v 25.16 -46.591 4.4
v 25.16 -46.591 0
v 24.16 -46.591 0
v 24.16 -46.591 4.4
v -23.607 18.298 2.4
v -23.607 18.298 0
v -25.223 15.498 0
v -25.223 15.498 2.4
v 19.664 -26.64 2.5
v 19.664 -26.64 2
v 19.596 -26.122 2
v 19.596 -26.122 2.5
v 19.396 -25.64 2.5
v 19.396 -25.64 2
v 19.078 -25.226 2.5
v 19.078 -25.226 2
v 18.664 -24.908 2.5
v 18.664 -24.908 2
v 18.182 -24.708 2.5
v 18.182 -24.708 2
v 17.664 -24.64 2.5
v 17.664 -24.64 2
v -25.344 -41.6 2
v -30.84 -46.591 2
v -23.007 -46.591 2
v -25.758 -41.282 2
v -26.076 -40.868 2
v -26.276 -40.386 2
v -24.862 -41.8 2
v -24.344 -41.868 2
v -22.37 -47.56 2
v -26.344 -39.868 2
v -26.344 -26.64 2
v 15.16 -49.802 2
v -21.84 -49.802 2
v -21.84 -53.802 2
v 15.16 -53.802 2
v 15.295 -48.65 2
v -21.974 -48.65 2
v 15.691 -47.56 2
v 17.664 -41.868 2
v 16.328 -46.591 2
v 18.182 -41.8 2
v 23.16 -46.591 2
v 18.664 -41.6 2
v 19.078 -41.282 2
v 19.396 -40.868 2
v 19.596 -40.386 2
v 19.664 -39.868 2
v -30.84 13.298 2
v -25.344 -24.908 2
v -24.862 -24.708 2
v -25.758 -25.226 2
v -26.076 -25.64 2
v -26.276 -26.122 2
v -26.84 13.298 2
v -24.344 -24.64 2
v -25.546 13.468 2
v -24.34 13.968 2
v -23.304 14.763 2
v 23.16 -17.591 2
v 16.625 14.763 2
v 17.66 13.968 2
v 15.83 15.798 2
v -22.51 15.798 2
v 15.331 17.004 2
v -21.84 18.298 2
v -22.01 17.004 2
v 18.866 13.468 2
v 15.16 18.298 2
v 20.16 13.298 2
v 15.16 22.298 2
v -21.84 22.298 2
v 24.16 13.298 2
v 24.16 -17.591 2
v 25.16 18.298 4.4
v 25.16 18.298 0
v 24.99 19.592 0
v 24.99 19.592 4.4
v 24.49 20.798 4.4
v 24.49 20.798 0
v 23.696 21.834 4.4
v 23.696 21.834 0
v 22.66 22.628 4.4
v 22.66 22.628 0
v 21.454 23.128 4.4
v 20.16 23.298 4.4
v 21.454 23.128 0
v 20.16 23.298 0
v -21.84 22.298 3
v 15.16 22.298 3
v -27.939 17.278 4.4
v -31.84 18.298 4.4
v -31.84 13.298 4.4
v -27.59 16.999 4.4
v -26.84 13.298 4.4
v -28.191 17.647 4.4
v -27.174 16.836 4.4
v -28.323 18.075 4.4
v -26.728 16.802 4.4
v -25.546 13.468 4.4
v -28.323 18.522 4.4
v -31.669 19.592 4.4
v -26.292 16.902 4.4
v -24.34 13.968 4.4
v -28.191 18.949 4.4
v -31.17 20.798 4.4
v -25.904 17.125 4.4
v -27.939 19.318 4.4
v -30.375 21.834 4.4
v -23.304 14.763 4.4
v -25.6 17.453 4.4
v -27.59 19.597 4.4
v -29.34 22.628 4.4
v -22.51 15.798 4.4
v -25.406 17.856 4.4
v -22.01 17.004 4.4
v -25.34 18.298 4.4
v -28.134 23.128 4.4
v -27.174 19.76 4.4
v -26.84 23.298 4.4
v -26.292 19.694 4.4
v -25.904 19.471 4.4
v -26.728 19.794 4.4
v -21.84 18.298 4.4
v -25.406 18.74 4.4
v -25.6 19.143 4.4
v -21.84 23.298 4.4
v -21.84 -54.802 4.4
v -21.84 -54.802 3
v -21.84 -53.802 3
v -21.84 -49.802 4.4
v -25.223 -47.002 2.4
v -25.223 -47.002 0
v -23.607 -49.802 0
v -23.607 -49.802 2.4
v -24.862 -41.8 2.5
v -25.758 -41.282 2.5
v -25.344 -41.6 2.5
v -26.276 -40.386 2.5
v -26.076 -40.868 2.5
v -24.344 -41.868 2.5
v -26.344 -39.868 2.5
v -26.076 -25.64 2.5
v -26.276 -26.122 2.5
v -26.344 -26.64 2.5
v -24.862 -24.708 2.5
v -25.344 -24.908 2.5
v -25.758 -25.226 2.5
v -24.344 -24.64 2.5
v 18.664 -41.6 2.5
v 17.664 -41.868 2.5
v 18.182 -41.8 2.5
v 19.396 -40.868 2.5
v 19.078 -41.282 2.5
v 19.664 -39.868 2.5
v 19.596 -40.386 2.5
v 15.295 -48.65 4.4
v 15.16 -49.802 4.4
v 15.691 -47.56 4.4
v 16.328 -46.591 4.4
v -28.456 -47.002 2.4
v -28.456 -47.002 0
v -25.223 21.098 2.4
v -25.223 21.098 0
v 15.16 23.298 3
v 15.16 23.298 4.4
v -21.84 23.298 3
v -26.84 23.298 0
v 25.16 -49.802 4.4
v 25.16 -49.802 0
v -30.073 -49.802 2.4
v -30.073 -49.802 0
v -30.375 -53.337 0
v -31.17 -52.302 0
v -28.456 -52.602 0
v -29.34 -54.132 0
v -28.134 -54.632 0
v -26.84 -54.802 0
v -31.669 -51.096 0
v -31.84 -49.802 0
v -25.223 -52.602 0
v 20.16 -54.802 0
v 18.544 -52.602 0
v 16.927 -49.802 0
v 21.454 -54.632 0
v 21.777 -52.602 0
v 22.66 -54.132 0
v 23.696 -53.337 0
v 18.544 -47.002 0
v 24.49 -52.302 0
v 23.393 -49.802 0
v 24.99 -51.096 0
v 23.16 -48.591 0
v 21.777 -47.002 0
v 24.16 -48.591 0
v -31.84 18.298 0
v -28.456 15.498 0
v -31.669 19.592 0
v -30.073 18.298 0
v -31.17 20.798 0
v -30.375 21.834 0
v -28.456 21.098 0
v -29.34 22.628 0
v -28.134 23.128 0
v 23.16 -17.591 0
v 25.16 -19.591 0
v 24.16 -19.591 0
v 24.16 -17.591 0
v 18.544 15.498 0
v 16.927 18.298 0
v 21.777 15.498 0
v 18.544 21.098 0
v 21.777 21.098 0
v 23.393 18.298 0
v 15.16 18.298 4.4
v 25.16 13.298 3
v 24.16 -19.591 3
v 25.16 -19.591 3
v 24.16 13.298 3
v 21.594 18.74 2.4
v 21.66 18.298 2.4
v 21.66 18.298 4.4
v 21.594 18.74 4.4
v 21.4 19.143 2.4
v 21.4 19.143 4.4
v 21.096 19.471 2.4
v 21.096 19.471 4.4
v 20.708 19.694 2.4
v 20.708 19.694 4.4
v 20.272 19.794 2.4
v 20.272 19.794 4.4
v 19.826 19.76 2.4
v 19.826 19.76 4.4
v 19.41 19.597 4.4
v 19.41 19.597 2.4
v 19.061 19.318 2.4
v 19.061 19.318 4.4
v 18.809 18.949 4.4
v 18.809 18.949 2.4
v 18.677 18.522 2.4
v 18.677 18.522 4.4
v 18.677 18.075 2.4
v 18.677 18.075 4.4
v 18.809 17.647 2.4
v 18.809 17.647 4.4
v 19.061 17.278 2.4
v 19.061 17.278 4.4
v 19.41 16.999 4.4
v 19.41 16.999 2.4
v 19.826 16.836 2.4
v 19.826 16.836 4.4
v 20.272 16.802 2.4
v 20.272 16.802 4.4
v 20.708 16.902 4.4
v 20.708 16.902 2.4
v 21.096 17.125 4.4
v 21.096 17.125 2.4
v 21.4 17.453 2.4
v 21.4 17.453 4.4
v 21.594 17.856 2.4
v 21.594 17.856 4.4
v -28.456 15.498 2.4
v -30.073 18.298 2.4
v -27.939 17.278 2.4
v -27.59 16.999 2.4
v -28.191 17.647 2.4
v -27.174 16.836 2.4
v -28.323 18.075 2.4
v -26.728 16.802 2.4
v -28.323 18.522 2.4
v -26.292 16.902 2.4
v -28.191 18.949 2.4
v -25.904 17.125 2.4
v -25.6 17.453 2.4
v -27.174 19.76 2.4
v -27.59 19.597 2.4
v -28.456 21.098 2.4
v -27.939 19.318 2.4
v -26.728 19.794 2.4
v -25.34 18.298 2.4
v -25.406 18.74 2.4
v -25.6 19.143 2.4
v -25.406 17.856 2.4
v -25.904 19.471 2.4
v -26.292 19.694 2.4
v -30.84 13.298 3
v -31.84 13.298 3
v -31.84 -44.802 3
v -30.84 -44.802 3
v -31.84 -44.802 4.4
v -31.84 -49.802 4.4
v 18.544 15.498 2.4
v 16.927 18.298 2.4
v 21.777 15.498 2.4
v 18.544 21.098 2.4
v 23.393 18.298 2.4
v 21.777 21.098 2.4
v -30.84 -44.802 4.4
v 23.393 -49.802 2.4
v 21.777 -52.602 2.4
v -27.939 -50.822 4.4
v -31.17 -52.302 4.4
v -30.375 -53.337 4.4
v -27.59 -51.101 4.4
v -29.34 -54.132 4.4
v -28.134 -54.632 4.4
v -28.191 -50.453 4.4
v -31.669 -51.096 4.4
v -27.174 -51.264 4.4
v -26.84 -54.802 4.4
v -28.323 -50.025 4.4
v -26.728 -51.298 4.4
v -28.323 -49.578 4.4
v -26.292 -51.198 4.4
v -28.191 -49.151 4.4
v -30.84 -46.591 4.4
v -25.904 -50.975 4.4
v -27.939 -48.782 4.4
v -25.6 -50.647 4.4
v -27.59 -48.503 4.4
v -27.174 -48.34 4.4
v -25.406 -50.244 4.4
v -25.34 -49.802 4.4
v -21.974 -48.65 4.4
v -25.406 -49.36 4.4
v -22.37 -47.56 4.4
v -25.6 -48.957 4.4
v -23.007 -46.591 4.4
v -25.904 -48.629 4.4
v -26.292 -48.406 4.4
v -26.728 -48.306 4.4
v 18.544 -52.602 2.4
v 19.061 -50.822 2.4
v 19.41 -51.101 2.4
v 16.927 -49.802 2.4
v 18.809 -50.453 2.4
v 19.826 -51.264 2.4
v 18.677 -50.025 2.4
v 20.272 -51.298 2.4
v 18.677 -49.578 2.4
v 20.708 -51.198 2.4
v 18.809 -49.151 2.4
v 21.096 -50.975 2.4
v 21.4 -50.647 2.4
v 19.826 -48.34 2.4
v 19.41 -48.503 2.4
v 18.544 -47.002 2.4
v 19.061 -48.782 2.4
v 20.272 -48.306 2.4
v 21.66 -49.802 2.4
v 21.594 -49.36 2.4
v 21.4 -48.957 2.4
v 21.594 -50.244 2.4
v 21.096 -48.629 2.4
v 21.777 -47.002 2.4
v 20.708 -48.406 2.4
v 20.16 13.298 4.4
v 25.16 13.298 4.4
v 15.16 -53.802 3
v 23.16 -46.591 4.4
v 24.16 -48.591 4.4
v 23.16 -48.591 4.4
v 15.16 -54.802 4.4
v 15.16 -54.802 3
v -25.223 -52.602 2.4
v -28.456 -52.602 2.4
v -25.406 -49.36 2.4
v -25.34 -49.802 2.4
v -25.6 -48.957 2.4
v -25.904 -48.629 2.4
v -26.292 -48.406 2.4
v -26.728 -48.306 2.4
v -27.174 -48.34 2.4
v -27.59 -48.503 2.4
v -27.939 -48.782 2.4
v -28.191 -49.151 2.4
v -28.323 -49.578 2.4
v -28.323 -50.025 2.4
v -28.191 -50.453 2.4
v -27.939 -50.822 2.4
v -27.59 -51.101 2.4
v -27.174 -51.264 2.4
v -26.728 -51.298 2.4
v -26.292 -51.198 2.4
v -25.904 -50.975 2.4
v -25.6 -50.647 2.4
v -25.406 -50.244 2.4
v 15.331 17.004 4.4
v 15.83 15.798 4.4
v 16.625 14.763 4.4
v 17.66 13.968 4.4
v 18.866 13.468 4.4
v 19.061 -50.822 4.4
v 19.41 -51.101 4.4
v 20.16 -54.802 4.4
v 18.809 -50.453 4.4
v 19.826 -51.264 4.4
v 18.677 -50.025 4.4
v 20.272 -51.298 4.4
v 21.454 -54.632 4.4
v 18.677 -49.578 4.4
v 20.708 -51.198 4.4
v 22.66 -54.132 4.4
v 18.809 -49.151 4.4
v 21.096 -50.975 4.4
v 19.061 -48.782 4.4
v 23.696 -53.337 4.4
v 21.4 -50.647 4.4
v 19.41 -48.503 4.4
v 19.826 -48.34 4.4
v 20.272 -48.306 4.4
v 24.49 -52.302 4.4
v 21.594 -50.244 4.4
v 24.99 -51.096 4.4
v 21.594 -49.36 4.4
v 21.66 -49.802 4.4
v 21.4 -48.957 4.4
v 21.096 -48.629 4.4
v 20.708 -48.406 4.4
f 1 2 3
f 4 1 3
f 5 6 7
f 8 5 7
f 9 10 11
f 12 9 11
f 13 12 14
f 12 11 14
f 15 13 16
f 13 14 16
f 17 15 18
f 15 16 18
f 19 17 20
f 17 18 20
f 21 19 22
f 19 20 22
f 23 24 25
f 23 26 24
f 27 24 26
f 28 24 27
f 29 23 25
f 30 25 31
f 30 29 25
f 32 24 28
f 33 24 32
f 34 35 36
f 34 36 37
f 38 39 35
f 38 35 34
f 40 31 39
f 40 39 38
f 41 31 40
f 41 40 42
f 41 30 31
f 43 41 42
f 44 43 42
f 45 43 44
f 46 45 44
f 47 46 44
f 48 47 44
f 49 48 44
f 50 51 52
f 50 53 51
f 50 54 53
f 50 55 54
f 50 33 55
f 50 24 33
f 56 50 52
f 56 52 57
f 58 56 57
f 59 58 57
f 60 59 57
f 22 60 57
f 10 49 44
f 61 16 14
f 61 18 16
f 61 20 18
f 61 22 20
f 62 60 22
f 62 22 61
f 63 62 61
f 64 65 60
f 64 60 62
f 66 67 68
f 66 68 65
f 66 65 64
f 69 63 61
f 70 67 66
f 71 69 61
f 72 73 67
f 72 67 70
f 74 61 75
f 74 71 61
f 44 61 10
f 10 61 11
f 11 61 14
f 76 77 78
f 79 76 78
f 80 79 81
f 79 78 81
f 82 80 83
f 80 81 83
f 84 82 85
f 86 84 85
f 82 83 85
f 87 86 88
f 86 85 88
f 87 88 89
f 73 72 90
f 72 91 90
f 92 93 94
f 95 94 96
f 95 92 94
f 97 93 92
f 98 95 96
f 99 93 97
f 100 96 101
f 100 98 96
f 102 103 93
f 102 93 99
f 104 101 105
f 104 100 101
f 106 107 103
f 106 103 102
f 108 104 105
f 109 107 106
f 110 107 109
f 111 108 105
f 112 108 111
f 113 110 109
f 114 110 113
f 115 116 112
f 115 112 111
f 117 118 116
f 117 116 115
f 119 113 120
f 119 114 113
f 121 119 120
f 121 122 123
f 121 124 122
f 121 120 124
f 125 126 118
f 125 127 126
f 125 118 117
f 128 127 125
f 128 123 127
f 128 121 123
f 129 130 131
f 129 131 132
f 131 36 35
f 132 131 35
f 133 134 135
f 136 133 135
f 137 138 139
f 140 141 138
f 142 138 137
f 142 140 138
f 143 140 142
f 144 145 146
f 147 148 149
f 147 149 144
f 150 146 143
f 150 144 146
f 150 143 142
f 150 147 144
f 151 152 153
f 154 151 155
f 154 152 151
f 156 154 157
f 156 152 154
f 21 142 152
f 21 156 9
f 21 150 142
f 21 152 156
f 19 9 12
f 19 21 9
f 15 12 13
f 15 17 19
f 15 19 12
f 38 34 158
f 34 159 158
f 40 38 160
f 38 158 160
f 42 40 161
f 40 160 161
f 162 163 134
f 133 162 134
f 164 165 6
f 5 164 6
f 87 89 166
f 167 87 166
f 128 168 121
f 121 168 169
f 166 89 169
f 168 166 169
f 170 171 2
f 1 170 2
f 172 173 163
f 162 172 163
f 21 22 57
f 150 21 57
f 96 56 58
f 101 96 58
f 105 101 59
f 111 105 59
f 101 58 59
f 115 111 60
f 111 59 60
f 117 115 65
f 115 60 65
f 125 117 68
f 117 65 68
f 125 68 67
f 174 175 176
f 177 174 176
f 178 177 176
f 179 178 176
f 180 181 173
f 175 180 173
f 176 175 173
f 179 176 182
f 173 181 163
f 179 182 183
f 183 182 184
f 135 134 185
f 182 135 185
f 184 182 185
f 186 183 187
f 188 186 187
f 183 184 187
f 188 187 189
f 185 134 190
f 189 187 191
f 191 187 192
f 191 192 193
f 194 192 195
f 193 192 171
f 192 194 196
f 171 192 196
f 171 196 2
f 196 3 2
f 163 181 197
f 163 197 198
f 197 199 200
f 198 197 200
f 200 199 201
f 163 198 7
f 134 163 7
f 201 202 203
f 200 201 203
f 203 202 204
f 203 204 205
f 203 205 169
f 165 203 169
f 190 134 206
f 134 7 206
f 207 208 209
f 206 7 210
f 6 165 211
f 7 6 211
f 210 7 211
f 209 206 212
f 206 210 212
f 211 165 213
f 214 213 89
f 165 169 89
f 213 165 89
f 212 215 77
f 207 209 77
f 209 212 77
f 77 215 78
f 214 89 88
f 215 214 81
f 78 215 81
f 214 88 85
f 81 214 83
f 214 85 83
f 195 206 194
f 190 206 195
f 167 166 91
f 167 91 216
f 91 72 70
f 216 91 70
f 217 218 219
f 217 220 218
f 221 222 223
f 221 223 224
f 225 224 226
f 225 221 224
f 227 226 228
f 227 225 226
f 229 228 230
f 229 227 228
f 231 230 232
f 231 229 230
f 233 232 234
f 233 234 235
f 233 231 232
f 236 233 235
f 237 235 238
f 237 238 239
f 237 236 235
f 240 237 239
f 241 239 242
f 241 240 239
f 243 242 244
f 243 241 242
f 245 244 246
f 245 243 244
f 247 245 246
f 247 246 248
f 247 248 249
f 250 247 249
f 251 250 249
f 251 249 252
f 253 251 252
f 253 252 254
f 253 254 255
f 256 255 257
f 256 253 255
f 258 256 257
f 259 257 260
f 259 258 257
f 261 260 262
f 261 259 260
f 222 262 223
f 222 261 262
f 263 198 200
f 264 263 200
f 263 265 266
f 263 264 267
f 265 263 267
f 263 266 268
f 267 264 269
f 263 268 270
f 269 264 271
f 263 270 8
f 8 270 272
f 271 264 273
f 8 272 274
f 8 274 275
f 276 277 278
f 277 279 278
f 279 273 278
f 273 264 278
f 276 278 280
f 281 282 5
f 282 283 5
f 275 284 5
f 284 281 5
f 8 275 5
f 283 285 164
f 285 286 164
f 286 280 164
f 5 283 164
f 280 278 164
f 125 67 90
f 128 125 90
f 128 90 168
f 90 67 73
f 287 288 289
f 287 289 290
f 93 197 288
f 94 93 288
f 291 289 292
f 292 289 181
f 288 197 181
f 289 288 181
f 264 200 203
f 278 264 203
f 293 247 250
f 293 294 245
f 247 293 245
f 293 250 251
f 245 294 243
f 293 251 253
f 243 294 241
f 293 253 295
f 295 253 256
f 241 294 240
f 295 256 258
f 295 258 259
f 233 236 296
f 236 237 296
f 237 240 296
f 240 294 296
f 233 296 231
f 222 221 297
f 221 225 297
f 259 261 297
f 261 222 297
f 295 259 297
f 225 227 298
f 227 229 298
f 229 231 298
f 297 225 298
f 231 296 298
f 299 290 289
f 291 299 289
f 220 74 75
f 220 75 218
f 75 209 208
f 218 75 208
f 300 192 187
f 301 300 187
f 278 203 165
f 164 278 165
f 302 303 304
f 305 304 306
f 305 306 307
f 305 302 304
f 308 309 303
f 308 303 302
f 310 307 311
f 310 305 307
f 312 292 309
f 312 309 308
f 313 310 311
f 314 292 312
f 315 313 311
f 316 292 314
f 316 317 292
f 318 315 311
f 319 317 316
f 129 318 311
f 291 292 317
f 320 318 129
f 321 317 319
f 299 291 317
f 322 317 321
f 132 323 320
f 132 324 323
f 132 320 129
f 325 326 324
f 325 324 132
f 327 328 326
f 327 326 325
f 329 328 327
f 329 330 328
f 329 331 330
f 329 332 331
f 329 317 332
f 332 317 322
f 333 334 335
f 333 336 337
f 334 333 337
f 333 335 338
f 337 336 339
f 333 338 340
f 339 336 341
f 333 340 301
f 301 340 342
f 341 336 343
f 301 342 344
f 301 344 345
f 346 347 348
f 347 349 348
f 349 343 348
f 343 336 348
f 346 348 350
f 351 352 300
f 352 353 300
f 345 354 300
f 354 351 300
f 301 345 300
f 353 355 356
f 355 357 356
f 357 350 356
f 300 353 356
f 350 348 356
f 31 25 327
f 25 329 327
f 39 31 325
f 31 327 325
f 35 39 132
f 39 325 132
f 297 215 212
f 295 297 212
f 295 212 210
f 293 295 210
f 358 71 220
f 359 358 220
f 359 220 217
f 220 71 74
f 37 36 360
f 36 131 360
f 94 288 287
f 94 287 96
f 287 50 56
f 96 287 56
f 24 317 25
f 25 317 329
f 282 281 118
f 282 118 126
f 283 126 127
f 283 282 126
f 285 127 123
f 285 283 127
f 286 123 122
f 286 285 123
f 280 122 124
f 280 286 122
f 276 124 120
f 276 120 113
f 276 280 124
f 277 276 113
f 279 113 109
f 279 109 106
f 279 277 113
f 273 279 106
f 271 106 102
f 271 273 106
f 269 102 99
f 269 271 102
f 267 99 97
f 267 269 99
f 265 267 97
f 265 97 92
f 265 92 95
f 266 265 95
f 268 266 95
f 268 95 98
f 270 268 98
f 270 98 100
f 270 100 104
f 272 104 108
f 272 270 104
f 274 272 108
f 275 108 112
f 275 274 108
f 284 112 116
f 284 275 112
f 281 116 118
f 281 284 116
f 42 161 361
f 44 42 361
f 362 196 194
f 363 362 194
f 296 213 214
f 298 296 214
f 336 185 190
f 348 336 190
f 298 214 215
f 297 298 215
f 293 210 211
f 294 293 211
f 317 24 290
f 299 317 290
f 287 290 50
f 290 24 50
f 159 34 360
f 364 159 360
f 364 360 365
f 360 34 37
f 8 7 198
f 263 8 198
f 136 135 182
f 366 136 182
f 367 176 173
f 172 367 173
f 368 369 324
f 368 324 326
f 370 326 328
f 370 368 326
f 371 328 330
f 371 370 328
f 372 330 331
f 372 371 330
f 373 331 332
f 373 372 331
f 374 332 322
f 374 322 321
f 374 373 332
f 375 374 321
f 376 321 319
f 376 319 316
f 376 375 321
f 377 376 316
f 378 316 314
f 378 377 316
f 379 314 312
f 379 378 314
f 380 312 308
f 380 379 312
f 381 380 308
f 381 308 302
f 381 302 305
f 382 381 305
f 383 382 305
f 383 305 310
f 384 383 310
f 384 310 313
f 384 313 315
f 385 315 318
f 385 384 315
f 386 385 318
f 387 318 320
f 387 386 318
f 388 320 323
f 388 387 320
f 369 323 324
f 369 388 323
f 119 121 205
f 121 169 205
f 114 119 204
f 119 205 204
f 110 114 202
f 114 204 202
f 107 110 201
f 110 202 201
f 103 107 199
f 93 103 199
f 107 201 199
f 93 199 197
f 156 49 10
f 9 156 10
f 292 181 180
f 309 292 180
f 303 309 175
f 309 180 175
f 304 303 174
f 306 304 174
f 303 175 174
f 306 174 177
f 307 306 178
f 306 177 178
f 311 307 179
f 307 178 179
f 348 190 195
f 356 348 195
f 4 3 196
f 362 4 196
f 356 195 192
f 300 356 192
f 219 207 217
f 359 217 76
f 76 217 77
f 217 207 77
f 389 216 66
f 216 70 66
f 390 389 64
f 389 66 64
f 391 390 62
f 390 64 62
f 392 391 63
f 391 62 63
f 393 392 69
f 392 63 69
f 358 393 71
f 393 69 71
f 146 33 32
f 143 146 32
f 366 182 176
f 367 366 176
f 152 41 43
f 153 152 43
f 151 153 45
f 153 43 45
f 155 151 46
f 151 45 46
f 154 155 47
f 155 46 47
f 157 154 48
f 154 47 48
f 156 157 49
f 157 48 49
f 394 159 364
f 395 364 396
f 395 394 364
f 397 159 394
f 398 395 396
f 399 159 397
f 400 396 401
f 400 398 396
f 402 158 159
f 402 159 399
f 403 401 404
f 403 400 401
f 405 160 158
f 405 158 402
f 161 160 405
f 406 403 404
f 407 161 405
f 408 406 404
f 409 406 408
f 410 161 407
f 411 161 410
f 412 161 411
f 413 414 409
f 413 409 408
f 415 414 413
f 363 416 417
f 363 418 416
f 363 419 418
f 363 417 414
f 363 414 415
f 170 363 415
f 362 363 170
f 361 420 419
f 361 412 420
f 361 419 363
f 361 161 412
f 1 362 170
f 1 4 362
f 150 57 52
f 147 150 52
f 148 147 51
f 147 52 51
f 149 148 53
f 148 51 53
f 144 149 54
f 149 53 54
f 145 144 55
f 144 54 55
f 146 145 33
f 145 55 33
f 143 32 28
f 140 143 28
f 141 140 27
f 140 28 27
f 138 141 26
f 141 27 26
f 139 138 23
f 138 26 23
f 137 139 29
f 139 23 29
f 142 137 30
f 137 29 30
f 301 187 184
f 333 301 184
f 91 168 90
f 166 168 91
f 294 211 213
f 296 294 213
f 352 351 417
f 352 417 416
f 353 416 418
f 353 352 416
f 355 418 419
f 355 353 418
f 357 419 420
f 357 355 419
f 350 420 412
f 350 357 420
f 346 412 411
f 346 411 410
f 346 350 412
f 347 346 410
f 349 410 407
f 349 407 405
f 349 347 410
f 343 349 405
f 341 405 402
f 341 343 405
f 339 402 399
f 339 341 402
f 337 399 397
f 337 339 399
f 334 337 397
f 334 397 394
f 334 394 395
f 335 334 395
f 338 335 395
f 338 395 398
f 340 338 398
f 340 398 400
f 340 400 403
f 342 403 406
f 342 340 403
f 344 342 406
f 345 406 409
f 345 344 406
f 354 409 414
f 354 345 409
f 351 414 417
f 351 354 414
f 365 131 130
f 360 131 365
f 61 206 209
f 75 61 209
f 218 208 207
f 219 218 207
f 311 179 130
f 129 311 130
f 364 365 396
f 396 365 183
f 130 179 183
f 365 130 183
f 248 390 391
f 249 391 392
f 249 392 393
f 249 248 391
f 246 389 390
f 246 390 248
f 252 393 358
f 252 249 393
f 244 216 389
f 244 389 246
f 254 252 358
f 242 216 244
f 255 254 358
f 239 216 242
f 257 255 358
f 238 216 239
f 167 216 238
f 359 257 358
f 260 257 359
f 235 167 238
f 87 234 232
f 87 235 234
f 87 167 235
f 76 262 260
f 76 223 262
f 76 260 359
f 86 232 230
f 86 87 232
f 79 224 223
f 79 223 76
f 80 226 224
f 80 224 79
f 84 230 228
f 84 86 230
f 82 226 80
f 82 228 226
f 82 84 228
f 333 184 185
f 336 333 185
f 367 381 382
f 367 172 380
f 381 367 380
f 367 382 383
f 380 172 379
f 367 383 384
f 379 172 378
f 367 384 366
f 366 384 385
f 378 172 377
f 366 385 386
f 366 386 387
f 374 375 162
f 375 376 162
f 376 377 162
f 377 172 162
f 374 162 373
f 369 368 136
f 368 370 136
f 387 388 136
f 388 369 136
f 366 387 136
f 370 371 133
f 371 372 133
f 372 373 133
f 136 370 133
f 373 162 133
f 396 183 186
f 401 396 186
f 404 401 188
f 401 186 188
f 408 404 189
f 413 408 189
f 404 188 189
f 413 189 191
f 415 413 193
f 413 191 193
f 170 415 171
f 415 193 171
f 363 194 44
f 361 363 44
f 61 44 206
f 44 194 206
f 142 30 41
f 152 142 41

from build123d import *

# Parameters (mm, degrees)
F1_DEPTH = 2.4
F2_R     = 1.5
F3_DEPTH = 2
F4_DEPTH = 0.4
F2_W     = 37
F2_H     = 1
F5_DEPTH = 0.6
F7_DEPTH = 4.4
F9_DEPTH = 0.5


with BuildPart() as f1:
    # F0 (on Top) → F1 (new body)
    with BuildSketch(Plane.XY):
        with BuildLine():
            Line((20.160271, 23.298074), (-26.839729, 23.298074))
            ThreePointArc((-26.839729, 23.298074), (-30.375263, 21.833608), (-31.839729, 18.298074))
            Line((-31.839729, 18.298074), (-31.839729, -49.801926))
            ThreePointArc((-31.839729, -49.801926), (-30.375263, -53.33746), (-26.839729, -54.801926))
            Line((-26.839729, -54.801926), (20.160271, -54.801926))
            ThreePointArc((20.160271, -54.801926), (23.695805, -53.33746), (25.160271, -49.801926))
            Line((25.160271, -49.801926), (25.160271, 18.298074))
            ThreePointArc((25.160271, 18.298074), (23.695805, 21.833608), (20.160271, 23.298074))
        make_face()
        Polygon((-30.072891, -49.801926), (-28.45631, -47.001926), (-25.223148, -47.001926), (-23.606568, -49.801926), (-25.223148, -52.601926), (-28.45631, -52.601926), align=None, mode=Mode.SUBTRACT)
        Polygon((16.927109, -49.801926), (18.54369, -47.001926), (21.776852, -47.001926), (23.393432, -49.801926), (21.776852, -52.601926), (18.54369, -52.601926), align=None, mode=Mode.SUBTRACT)
        Polygon((-30.072891, 18.298074), (-28.45631, 21.098074), (-25.223148, 21.098074), (-23.606568, 18.298074), (-25.223148, 15.498074), (-28.45631, 15.498074), align=None, mode=Mode.SUBTRACT)
        Polygon((16.927109, 18.298074), (18.54369, 21.098074), (21.776852, 21.098074), (23.393432, 18.298074), (21.776852, 15.498074), (18.54369, 15.498074), align=None, mode=Mode.SUBTRACT)
    extrude(amount=F1_DEPTH)

    # F2 (on face) → F3 (join)
    with BuildSketch(Plane.XY.offset(2.4)):
        with BuildLine():
            Line((-21.839729, 23.298074), (-26.839729, 23.298074))
            ThreePointArc((-26.839729, 23.298074), (-30.375263, 21.833608), (-31.839729, 18.298074))
            Line((-31.839729, 18.298074), (-31.839729, 13.298074))
            Line((-31.839729, 13.298074), (-30.839729, 13.298074))
            Line((-30.839729, 13.298074), (-26.839729, 13.298074))
            ThreePointArc((-26.839729, 13.298074), (-23.304195, 14.76254), (-21.839729, 18.298074))
            Line((-21.839729, 18.298074), (-21.839729, 22.298074))
            Line((-21.839729, 22.298074), (-21.839729, 23.298074))
        make_face()
        Polygon((-28.45631, 15.498074), (-30.072891, 18.298074), (-28.45631, 21.098074), (-25.223148, 21.098074), (-23.606568, 18.298074), (-25.223148, 15.498074), align=None, mode=Mode.SUBTRACT)
        with BuildLine():
            Line((20.160271, 23.298074), (15.160271, 23.298074))
            Line((15.160271, 23.298074), (15.160271, 22.298074))
            Line((15.160271, 22.298074), (15.160271, 18.298074))
            ThreePointArc((15.160271, 18.298074), (16.624737, 14.76254), (20.160271, 13.298074))
            Line((20.160271, 13.298074), (24.160271, 13.298074))
            Line((24.160271, 13.298074), (25.160271, 13.298074))
            Line((25.160271, 13.298074), (25.160271, 18.298074))
            ThreePointArc((25.160271, 18.298074), (23.695805, 21.833608), (20.160271, 23.298074))
        make_face()
        Polygon((23.393432, 18.298074), (21.776852, 15.498074), (18.54369, 15.498074), (16.927109, 18.298074), (18.54369, 21.098074), (21.776852, 21.098074), align=None, mode=Mode.SUBTRACT)
        with BuildLine():
            Line((25.160271, -49.801926), (25.160271, -44.801926))
            Line((25.160271, -44.801926), (24.160271, -44.801926))
            Line((24.160271, -44.801926), (24.160271, -46.590926))
            Line((24.160271, -46.590926), (16.327585, -46.590926))
            ThreePointArc((16.327585, -46.590926), (15.461152, -48.093627), (15.160271, -49.801926))
            Line((15.160271, -49.801926), (15.160271, -53.801926))
            Line((15.160271, -53.801926), (15.160271, -54.801926))
            Line((15.160271, -54.801926), (20.160271, -54.801926))
            ThreePointArc((20.160271, -54.801926), (23.695805, -53.33746), (25.160271, -49.801926))
        make_face()
        Polygon((18.54369, -52.601926), (16.927109, -49.801926), (18.54369, -47.001926), (21.776852, -47.001926), (23.393432, -49.801926), (21.776852, -52.601926), align=None, mode=Mode.SUBTRACT)
        with BuildLine():
            Line((-30.839729, -44.801926), (-31.839729, -44.801926))
            Line((-31.839729, -44.801926), (-31.839729, -49.801926))
            ThreePointArc((-31.839729, -49.801926), (-30.375263, -53.33746), (-26.839729, -54.801926))
            Line((-26.839729, -54.801926), (-21.839729, -54.801926))
            Line((-21.839729, -54.801926), (-21.839729, -53.801926))
            Line((-21.839729, -53.801926), (-21.839729, -49.801926))
            ThreePointArc((-21.839729, -49.801926), (-22.140611, -48.093627), (-23.007044, -46.590926))
            Line((-23.007044, -46.590926), (-30.839729, -46.590926))
            Line((-30.839729, -46.590926), (-30.839729, -44.801926))
        make_face()
        Polygon((-25.223148, -52.601926), (-28.45631, -52.601926), (-30.072891, -49.801926), (-28.45631, -47.001926), (-25.223148, -47.001926), (-23.606568, -49.801926), align=None, mode=Mode.SUBTRACT)
        Polygon((-30.072891, -49.801926), (-28.45631, -52.601926), (-25.223148, -52.601926), (-23.606568, -49.801926), (-25.223148, -47.001926), (-28.45631, -47.001926), align=None)
        with Locations((-26.839729, -49.801926)):
            Circle(F2_R, mode=Mode.SUBTRACT)
        Polygon((18.54369, -47.001926), (16.927109, -49.801926), (18.54369, -52.601926), (21.776852, -52.601926), (23.393432, -49.801926), (21.776852, -47.001926), align=None)
        with Locations((20.160271, -49.801926)):
            Circle(F2_R, mode=Mode.SUBTRACT)
        Polygon((18.54369, 15.498074), (21.776852, 15.498074), (23.393432, 18.298074), (21.776852, 21.098074), (18.54369, 21.098074), (16.927109, 18.298074), align=None)
        with Locations((20.160271, 18.298074)):
            Circle(F2_R, mode=Mode.SUBTRACT)
        Polygon((-28.45631, 21.098074), (-30.072891, 18.298074), (-28.45631, 15.498074), (-25.223148, 15.498074), (-23.606568, 18.298074), (-25.223148, 21.098074), align=None)
        with Locations((-26.839729, 18.298074)):
            Circle(F2_R, mode=Mode.SUBTRACT)
    extrude(amount=F3_DEPTH)

    # F2 (on face) → F4 (cut)
    with BuildSketch(Plane.XY.offset(2.4)):
        with BuildLine():
            Line((15.160271, 22.298074), (-21.839729, 22.298074))
            Line((-21.839729, 22.298074), (-21.839729, 18.298074))
            ThreePointArc((-21.839729, 18.298074), (-23.304195, 14.76254), (-26.839729, 13.298074))
            Line((-26.839729, 13.298074), (-30.839729, 13.298074))
            Line((-30.839729, 13.298074), (-30.839729, -43.238085))
            Line((-30.839729, -43.238085), (-30.839729, -44.801926))
            Line((-30.839729, -44.801926), (-30.839729, -46.590926))
            Line((-30.839729, -46.590926), (-23.007044, -46.590926))
            ThreePointArc((-23.007044, -46.590926), (-22.140611, -48.093627), (-21.839729, -49.801926))
            Line((-21.839729, -49.801926), (-21.839729, -53.801926))
            Line((-21.839729, -53.801926), (15.160271, -53.801926))
            Line((15.160271, -53.801926), (15.160271, -49.801926))
            ThreePointArc((15.160271, -49.801926), (15.461152, -48.093627), (16.327585, -46.590926))
            Line((16.327585, -46.590926), (24.160271, -46.590926))
            Line((24.160271, -46.590926), (24.160271, -44.801926))
            Line((24.160271, -44.801926), (24.160271, -43.238085))
            Line((24.160271, -43.238085), (24.160271, 13.298074))
            Line((24.160271, 13.298074), (20.160271, 13.298074))
            ThreePointArc((20.160271, 13.298074), (16.624737, 14.76254), (15.160271, 18.298074))
            Line((15.160271, 18.298074), (15.160271, 22.298074))
        make_face()
    extrude(amount=-F4_DEPTH, mode=Mode.SUBTRACT)

    # F2 (on face) → F5 (join)
    with BuildSketch(Plane.XY.offset(2.4)):
        Polygon((-30.839729, 13.298074), (-31.839729, 13.298074), (-31.839729, -44.801926), (-30.839729, -44.801926), (-30.839729, -43.238085), align=None)
        with Locations((-3.339729, 22.798074)):
            Rectangle(F2_W, F2_H)
        Polygon((25.160271, -44.801926), (25.160271, 13.298074), (24.160271, 13.298074), (24.160271, -43.238085), (24.160271, -44.801926), align=None)
        with Locations((-3.339729, -54.301926)):
            Rectangle(F2_W, F2_H)
    extrude(amount=F5_DEPTH)

    # F6 (on face) → F7 (cut)
    with BuildSketch(Plane(origin=(0, 0, 0), x_dir=(1, 0, 0), z_dir=(0, 0, -1))):
        Polygon((24.160271, 19.590926), (25.160271, 19.590926), (25.160271, 46.590926), (24.160271, 46.590926), (24.160271, 48.590926), (23.160271, 48.590926), (23.160271, 46.590926), (23.160271, 19.590926), (23.160271, 17.590926), (24.160271, 17.590926), align=None)
    extrude(amount=-F7_DEPTH, mode=Mode.SUBTRACT)

    # F8 (on face) → F9 (join)
    with BuildSketch(Plane.XY.offset(2)):
        with BuildLine():
            ThreePointArc((19.663978, -26.639785), (19.078192, -25.225571), (17.663978, -24.639785))
            Line((17.663978, -24.639785), (-24.344087, -24.639785))
            ThreePointArc((-24.344087, -24.639785), (-25.758301, -25.225571), (-26.344087, -26.639785))
            Line((-26.344087, -26.639785), (-26.344087, -39.868281))
            ThreePointArc((-26.344087, -39.868281), (-25.758301, -41.282494), (-24.344087, -41.868281))
            Line((-24.344087, -41.868281), (17.663978, -41.868281))
            ThreePointArc((17.663978, -41.868281), (19.078192, -41.282494), (19.663978, -39.868281))
            Line((19.663978, -39.868281), (19.663978, -26.639785))
        make_face()
    extrude(amount=F9_DEPTH)


solid = f1.part
